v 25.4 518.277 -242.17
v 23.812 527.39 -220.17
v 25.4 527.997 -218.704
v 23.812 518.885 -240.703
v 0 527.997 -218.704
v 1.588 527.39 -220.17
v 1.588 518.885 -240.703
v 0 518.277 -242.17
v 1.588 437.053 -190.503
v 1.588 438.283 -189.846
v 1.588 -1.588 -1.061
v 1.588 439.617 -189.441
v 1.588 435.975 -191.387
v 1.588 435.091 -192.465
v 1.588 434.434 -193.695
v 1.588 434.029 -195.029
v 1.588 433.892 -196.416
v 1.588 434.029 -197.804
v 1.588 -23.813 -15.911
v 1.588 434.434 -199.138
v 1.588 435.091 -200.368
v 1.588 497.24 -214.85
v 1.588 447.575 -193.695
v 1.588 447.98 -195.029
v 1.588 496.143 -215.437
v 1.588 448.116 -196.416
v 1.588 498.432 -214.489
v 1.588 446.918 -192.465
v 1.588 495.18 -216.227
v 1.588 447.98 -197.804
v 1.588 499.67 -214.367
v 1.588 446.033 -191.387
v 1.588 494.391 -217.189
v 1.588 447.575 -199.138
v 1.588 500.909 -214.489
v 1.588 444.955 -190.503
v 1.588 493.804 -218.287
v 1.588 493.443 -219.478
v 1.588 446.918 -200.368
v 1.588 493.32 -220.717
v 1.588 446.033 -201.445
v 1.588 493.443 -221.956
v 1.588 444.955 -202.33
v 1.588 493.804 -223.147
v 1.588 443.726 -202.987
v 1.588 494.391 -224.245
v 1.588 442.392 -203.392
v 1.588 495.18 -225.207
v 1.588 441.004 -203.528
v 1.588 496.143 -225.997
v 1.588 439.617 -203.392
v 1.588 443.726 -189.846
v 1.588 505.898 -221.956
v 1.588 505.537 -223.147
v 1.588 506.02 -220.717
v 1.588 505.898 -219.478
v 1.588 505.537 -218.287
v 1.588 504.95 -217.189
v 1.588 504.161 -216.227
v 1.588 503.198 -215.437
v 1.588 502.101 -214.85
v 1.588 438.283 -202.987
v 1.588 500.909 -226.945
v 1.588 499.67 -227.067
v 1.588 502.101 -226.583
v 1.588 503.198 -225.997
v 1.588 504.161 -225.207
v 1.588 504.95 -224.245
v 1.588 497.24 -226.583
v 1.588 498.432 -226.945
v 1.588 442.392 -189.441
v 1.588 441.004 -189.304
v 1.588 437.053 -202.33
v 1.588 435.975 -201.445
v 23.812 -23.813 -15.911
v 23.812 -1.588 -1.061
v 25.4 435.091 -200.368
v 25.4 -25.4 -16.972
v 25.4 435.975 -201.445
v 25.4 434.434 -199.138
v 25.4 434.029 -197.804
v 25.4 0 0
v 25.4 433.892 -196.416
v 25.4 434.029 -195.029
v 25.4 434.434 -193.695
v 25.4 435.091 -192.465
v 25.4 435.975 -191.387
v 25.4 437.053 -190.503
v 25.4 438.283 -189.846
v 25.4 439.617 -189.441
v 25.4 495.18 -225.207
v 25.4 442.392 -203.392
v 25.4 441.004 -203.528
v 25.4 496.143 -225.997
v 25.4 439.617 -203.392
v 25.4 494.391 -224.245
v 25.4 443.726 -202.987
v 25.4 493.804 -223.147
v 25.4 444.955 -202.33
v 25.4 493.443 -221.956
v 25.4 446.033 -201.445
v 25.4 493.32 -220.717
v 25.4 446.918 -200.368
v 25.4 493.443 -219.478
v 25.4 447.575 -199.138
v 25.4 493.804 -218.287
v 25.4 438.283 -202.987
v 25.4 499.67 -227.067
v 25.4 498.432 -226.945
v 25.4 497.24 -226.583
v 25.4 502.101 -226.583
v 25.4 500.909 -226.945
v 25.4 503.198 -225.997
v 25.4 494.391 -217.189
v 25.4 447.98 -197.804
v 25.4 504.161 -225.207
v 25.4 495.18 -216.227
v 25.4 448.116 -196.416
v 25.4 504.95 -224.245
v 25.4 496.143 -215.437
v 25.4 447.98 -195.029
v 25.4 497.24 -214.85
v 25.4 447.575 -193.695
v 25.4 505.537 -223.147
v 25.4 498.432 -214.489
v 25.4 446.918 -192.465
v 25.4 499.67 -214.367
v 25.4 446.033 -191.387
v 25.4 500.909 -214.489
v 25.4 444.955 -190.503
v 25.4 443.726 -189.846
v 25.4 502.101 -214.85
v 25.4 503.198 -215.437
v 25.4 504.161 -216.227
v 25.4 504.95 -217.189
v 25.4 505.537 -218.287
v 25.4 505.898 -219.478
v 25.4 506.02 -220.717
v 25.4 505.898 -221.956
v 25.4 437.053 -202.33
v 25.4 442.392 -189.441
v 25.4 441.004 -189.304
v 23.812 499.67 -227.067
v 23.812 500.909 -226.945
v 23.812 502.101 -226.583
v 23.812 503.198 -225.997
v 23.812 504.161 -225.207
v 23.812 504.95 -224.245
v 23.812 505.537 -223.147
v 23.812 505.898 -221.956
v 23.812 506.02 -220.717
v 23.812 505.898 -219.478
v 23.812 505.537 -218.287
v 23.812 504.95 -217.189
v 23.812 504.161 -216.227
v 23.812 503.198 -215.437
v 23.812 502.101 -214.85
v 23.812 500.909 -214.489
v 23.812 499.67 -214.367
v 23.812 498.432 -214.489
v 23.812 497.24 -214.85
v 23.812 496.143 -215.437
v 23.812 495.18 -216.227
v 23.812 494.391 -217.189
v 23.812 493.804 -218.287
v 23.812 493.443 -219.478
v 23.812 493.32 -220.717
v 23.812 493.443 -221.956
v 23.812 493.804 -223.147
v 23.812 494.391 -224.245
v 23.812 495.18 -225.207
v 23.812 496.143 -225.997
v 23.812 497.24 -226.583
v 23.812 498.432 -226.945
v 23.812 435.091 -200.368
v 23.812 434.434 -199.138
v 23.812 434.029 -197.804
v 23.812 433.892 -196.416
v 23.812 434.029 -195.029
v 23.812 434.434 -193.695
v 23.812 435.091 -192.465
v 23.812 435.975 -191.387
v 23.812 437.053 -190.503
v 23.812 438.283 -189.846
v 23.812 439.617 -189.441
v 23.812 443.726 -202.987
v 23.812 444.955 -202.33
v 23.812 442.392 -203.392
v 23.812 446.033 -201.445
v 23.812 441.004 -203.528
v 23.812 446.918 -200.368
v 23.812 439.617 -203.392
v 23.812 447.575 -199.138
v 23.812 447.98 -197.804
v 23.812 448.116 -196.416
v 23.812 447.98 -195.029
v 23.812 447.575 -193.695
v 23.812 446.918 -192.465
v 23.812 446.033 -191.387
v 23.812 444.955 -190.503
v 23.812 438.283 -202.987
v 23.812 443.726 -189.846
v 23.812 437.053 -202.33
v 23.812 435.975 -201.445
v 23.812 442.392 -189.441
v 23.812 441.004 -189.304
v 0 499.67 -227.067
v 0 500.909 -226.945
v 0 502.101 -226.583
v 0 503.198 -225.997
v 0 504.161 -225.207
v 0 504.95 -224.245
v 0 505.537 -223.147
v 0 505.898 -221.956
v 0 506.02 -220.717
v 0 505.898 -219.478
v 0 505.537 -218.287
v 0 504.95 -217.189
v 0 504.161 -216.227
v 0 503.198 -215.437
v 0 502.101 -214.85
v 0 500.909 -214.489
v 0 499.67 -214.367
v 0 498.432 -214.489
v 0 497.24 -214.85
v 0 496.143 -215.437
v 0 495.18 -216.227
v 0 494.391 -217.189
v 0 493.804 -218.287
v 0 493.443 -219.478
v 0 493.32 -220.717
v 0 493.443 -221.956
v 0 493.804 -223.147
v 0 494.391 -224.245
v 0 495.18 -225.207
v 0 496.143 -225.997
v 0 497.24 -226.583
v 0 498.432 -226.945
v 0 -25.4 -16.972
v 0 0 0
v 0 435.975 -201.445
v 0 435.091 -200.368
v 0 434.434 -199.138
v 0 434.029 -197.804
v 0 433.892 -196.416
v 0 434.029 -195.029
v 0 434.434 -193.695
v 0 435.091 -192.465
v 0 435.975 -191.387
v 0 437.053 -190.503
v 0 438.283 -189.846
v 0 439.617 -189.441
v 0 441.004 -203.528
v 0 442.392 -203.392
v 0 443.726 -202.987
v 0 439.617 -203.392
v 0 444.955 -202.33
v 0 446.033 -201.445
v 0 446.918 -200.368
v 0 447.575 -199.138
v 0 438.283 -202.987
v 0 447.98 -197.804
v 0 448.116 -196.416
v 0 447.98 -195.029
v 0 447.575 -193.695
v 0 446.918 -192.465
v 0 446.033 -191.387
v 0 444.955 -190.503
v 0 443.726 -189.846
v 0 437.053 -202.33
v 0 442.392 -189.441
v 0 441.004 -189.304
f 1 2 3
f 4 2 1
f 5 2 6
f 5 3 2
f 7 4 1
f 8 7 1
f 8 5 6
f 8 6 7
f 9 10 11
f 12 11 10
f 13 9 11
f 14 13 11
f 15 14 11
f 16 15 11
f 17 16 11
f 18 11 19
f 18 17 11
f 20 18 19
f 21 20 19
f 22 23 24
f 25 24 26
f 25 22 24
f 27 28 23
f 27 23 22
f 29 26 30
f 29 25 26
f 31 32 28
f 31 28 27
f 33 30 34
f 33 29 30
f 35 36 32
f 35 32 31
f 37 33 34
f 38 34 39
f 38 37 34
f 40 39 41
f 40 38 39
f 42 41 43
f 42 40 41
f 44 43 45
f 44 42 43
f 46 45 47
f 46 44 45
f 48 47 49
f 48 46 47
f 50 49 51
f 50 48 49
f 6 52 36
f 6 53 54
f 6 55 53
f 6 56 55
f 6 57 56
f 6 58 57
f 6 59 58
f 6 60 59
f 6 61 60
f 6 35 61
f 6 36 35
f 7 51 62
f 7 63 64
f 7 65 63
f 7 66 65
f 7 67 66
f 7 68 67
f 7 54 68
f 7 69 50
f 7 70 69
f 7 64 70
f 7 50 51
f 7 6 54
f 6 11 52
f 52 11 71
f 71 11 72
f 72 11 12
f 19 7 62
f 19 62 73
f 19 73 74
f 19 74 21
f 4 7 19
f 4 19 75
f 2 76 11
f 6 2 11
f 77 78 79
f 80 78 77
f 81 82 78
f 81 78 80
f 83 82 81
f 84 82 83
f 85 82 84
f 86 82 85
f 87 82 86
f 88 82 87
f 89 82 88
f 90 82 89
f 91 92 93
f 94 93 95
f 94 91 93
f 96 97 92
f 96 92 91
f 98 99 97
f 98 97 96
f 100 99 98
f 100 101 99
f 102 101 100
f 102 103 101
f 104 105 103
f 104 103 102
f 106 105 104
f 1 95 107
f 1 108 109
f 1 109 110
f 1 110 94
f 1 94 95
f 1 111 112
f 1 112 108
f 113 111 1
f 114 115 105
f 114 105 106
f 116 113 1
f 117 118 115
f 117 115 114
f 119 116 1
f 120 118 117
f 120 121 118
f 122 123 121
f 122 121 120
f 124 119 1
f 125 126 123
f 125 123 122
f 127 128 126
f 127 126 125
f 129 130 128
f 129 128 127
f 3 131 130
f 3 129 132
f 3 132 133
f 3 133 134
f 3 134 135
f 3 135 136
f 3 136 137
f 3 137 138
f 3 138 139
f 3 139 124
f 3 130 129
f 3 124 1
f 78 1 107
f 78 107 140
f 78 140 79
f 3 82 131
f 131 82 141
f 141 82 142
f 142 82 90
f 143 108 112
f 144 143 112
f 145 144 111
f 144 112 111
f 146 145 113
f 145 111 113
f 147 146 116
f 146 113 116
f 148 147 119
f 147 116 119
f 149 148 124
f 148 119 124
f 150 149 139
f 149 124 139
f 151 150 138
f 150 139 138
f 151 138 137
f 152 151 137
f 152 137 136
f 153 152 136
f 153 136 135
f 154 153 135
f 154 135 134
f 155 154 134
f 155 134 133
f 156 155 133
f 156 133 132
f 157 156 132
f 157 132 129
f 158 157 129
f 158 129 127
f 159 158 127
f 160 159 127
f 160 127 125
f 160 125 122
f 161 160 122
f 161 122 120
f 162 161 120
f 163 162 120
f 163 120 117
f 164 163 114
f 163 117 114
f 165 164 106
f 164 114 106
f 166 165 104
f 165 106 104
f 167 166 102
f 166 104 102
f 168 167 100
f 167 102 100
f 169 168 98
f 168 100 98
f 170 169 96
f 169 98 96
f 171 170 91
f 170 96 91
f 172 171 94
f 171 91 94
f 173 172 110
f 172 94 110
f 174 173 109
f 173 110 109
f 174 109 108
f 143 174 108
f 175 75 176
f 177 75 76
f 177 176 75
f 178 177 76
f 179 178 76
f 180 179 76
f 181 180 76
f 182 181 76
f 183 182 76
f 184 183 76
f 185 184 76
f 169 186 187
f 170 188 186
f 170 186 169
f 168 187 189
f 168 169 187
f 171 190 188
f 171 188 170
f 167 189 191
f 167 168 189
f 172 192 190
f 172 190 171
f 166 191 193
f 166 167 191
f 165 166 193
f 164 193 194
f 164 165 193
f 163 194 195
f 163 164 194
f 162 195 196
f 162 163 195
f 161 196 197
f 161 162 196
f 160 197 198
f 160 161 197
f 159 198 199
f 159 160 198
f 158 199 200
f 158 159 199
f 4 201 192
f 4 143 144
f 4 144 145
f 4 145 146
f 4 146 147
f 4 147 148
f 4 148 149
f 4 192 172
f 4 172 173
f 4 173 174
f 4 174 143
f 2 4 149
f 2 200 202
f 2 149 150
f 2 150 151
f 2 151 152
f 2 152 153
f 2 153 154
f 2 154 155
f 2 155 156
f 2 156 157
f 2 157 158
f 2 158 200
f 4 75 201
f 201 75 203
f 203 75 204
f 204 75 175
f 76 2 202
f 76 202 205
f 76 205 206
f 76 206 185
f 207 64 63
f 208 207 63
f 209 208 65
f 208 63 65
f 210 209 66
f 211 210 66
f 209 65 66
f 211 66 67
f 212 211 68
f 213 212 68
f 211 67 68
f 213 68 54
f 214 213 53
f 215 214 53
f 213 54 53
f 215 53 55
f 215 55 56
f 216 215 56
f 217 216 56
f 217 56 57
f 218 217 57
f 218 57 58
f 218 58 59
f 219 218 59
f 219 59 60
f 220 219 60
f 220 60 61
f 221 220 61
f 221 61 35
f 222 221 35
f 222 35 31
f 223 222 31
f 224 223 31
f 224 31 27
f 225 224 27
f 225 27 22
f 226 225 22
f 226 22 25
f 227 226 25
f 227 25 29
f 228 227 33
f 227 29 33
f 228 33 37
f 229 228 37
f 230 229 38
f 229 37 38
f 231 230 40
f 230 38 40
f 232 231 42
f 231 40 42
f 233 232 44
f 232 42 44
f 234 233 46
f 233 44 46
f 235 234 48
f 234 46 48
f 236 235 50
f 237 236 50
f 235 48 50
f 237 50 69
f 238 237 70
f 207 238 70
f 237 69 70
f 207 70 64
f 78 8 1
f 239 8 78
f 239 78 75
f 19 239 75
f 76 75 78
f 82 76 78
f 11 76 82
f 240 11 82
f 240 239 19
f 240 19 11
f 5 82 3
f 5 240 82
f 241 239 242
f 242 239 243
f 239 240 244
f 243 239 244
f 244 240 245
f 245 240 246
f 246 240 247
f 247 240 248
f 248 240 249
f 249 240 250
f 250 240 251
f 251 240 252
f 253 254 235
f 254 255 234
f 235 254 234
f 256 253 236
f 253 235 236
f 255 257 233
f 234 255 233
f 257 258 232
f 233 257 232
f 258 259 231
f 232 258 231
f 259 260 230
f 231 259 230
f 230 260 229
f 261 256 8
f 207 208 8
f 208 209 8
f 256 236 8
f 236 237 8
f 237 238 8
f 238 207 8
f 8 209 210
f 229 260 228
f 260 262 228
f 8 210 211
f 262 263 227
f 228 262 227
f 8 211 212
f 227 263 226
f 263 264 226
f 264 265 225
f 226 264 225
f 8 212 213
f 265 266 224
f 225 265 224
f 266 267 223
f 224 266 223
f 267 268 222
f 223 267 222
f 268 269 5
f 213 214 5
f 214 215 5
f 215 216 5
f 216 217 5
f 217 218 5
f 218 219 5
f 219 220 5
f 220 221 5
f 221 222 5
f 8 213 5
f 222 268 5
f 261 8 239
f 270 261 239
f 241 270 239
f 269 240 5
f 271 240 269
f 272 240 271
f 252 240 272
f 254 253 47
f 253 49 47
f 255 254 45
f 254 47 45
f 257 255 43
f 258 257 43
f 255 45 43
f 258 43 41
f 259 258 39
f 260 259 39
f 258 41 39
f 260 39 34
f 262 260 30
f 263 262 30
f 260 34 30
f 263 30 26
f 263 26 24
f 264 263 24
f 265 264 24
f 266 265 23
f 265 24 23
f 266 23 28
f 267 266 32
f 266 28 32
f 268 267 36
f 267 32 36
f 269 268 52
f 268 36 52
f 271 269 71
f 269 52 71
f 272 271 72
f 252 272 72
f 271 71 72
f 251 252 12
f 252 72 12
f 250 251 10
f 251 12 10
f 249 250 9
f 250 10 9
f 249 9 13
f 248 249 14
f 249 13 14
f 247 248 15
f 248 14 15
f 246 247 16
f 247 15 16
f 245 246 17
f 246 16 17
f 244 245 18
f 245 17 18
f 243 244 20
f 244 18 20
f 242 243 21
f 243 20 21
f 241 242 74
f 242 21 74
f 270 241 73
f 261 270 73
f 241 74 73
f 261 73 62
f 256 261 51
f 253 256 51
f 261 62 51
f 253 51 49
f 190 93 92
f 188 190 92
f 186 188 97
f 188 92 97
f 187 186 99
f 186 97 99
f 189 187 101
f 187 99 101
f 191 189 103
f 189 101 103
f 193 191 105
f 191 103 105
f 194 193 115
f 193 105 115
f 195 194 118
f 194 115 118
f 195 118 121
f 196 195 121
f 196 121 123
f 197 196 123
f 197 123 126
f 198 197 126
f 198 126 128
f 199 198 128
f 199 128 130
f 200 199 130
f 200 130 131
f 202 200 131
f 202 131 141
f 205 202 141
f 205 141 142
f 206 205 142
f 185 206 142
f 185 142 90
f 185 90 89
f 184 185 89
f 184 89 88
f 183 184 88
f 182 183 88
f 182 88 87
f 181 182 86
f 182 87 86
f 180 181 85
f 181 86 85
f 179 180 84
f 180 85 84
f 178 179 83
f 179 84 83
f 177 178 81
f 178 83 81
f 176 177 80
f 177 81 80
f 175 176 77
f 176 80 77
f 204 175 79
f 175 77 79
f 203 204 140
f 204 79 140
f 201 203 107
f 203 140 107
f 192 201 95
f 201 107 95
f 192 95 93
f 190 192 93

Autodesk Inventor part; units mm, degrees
ref_plane "YZ Plane" through (0, 0, 0) normal (1, 0, 0) x (0, 1, 0)
ref_plane "XZ Plane" through (0, 0, 0) normal (0, 1, 0) x (-1, 0, 0)
ref_plane "XY Plane" through (0, 0, 0) normal (0, 0, 1) x (1, 0, 0)
sketch "Sketch1" plane through (0, 0, 0) normal (1, 0, 0) x (0, 1, 0)
  line L0 (0, 0) -> (0, 254)
  line L1 (0, 0) -> (254, 0) construction
  line L2 (0, 0) -> (527.9972, -218.7036)
  line L3 (0, 0) -> (571.5, 0) construction
  line L4 (0, 254) -> (-25.4, 254)
  line L5 (0, 254) -> (25.4, 254) construction
  line L6 (527.9972, -218.7036) -> (518.277, -242.1701)
  line L7 (527.9972, -218.7036) -> (553.3972, -218.7036) construction
  line L8 (518.277, -242.1701) -> (-25.4, -16.9717)
  line L9 (-25.4, -16.9717) -> (-25.4, 254)
  line L10 (-25.4, -16.9717) -> (0, 0)
  dimension "d0" = 254
  dimension "d1" = 90
  dimension "d2" = 571.5
  dimension "d3" = 22.5
  dimension "d4" = 25.4
  dimension "d5" = 180
  dimension "d6" = 25.4
  dimension "d7" = 112.5
  dimension "d8" = 90
extrude "Extrusion3" add sketch "Sketch1" along normal blind 25.4 contours L2 L6 L8 L10
sketch "Sketch3" plane through (0, 527.9972, -218.7036) normal (0, 0.9239, -0.3827) x (1, 0, 0)
  line L0 (0, 25.4) -> (1.5875, 25.4)
  line L1 (1.5875, 25.4) -> (1.5875, 23.8125)
  line L2 (1.5875, 23.8125) -> (0, 23.8125)
  line L3 (0, 23.8125) -> (0, 25.4)
  line L4 (25.4, 0) -> (23.8125, 0)
  line L5 (23.8125, 0) -> (23.8125, 1.5875)
  line L6 (23.8125, 1.5875) -> (25.4, 1.5875)
  line L7 (25.4, 1.5875) -> (25.4, 0)
  line L8 (1.5875, 23.8125) -> (23.8125, 23.8125)
  line L9 (23.8125, 23.8125) -> (23.8125, 1.5875)
  line L10 (23.8125, 1.5875) -> (1.5875, 1.5875)
  line L11 (1.5875, 1.5875) -> (1.5875, 23.8125)
  dimension "d19" = 1.5875
  dimension "d20" = 1.5875
  dimension "d21" = 1.5875
  dimension "d22" = 1.5875
extrude "Extrusion4" cut sketch "Sketch3" against normal blind 2540 contours L8 L9 L10 L11
sketch "Sketch4" plane through (25.4, 0, 0) normal (1, 0, 0) x (0, 0, -1)
  line L0 (242.1701, 518.277) -> (218.7036, 527.9972) projected
  line L1 (218.7036, 527.9972) -> (0, 0) projected
  line L2 (230.4369, 523.1371) -> (220.7167, 499.6705)
  line L3 (230.4369, 523.1371) -> (255.8369, 523.1371) construction
  circle A0 centre (220.7167, 499.6705) radius 6.35
  line L4 (220.7167, 499.6705) -> (196.4163, 441.0042)
  circle A1 centre (196.4163, 441.0042) radius 7.112
  dimension "d25" = 25.4
  dimension "d26" = 112.5
  dimension "d27" = 12.7
  dimension "d28" = 63.5
  dimension "d29" = 14.224
extrude "Extrusion5" cut sketch "Sketch4" against normal blind 50.8
properties part number "CatapultArmSquare-Top"
